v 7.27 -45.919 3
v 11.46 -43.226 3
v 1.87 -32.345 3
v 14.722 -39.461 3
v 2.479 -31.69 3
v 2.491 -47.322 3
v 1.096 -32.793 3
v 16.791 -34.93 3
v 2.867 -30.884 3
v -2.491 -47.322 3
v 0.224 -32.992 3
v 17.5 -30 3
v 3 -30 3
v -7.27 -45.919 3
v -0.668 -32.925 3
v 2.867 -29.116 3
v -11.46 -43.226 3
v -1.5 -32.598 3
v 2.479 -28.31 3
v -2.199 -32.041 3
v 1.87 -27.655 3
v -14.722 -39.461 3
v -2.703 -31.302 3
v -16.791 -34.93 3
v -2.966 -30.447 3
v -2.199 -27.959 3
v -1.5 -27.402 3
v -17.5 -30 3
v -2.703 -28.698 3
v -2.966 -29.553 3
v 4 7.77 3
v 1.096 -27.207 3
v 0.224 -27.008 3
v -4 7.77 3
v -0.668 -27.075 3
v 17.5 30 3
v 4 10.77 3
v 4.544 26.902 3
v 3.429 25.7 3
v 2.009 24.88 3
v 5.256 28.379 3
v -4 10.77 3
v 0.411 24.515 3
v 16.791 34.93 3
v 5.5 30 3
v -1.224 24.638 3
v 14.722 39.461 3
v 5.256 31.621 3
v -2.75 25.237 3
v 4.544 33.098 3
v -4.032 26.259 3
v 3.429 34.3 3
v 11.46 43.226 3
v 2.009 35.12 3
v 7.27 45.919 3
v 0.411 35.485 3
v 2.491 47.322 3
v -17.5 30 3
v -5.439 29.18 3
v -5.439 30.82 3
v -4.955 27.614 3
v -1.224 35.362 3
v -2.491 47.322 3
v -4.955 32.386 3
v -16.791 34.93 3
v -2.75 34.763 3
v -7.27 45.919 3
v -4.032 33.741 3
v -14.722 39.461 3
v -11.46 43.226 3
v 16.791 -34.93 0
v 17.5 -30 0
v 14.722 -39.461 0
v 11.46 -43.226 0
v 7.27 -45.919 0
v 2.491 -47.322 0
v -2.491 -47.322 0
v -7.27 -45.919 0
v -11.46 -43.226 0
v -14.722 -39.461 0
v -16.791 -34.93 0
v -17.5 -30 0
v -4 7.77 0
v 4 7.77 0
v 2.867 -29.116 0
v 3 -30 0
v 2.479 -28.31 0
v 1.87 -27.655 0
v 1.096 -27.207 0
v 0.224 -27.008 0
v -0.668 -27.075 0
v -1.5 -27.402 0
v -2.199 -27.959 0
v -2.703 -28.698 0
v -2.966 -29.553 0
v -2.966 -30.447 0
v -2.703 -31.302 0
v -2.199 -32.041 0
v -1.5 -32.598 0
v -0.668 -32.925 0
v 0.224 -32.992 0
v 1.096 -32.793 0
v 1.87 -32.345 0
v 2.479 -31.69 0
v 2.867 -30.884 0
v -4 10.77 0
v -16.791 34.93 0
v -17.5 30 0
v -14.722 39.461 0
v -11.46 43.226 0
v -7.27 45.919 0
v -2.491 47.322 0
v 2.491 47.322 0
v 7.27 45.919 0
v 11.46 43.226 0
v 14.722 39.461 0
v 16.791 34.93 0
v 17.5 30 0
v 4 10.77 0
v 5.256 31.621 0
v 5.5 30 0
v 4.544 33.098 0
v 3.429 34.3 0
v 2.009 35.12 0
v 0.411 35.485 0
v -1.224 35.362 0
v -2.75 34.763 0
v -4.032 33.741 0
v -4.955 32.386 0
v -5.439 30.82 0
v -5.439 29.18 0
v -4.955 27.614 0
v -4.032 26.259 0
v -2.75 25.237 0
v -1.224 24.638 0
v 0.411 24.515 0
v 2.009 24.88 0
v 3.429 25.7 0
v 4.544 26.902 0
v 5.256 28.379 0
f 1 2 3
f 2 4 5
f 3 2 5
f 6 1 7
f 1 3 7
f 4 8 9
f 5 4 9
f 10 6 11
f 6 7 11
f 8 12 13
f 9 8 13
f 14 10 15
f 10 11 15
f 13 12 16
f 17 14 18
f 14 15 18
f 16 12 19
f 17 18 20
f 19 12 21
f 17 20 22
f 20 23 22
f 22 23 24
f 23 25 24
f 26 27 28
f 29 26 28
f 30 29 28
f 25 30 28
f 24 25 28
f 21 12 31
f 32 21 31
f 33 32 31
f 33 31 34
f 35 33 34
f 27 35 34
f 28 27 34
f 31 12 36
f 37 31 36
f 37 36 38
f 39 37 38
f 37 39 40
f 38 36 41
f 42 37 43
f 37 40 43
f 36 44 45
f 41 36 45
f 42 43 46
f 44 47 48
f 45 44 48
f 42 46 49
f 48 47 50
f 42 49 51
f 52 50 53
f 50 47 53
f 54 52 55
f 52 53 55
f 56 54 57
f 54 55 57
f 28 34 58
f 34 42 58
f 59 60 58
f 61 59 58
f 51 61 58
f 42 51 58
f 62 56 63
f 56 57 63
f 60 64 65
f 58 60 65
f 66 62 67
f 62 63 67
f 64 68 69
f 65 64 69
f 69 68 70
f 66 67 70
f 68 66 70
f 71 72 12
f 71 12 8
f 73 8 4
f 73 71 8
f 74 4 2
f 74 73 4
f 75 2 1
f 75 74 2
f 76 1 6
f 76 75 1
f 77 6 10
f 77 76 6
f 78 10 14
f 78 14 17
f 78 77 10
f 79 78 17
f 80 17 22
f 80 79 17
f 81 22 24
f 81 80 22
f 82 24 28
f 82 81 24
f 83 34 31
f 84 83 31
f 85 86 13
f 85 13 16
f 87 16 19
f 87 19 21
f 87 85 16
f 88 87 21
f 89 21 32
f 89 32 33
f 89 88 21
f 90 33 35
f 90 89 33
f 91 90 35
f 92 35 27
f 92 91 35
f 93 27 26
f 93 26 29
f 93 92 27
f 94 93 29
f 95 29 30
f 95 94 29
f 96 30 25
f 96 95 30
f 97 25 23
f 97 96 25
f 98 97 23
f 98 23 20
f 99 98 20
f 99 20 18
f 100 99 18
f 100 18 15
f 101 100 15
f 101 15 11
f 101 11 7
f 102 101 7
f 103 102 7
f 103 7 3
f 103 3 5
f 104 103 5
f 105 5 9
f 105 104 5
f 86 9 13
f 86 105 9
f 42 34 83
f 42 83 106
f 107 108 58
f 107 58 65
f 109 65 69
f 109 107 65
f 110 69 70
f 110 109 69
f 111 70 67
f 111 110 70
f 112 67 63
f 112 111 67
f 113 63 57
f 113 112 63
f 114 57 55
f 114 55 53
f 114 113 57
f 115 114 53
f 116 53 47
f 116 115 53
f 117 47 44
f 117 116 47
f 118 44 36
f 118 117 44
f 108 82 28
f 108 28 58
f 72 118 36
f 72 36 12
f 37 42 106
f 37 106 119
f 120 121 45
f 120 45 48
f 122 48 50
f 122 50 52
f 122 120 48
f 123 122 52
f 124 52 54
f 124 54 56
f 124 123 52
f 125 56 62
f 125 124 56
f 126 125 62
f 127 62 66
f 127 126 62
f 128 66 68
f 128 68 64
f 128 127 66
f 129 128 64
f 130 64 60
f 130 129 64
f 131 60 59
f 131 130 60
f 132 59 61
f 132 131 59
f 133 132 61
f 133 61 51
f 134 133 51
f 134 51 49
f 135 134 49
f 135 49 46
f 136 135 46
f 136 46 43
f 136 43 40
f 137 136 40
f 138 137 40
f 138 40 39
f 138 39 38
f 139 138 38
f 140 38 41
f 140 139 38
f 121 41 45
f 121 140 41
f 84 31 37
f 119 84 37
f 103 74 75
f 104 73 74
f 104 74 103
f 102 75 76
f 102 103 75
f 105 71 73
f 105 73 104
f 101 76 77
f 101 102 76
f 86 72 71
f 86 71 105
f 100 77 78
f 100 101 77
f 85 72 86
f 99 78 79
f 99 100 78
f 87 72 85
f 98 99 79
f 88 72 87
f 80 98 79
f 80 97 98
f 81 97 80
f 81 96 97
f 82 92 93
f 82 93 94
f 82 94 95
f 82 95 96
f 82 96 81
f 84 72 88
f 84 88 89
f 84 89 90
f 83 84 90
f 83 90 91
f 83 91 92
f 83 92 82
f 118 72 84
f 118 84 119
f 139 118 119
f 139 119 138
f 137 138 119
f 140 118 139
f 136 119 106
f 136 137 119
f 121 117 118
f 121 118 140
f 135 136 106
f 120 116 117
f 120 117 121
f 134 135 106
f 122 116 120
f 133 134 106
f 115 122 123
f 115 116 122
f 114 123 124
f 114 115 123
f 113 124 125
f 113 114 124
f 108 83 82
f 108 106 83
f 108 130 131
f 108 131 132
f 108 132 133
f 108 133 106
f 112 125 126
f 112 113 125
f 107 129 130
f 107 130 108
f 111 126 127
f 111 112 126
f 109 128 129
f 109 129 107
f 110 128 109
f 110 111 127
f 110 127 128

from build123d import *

# Parameters (mm, degrees)
CROQUIS1_R              = 5.5
CROQUIS1_R_2            = 3
SALIENTE_EXTRUIR1_DEPTH = 3
CORTAR_EXTRUIR1_REACH   = 52.71
CROQUIS2_W              = 8
CROQUIS2_H              = 3


with BuildPart() as part:
    # Croquis1 → Saliente-Extruir1 (new body)
    with BuildSketch(Plane.XY):
        with BuildLine():
            Line((-17.5, -30), (-17.5, 30))
            ThreePointArc((-17.5, 30), (0, 47.5), (17.5, 30))
            Line((17.5, 30), (17.5, -30))
            ThreePointArc((17.5, -30), (0, -47.5), (-17.5, -30))
        make_face()
        with Locations((0, 30)):
            Circle(CROQUIS1_R, mode=Mode.SUBTRACT)
        with Locations((0, -30)):
            Circle(CROQUIS1_R_2, mode=Mode.SUBTRACT)
    extrude(amount=SALIENTE_EXTRUIR1_DEPTH)

    # Croquis2 → Cortar-Extruir1 (cut, up to next)
    with BuildSketch(Plane.XY.offset(3), mode=Mode.PRIVATE) as cortar_extruir1_sk1:
        with Locations((0, 9.27)):
            Rectangle(CROQUIS2_W, CROQUIS2_H)
    cortar_extruir1_tool1 = extrude(cortar_extruir1_sk1.sketch, amount=-CORTAR_EXTRUIR1_REACH, mode=Mode.PRIVATE) & part.part
    add(cortar_extruir1_tool1.solids().sort_by_distance((0, 9.27, 3))[0], mode=Mode.SUBTRACT)


solid = part.part
